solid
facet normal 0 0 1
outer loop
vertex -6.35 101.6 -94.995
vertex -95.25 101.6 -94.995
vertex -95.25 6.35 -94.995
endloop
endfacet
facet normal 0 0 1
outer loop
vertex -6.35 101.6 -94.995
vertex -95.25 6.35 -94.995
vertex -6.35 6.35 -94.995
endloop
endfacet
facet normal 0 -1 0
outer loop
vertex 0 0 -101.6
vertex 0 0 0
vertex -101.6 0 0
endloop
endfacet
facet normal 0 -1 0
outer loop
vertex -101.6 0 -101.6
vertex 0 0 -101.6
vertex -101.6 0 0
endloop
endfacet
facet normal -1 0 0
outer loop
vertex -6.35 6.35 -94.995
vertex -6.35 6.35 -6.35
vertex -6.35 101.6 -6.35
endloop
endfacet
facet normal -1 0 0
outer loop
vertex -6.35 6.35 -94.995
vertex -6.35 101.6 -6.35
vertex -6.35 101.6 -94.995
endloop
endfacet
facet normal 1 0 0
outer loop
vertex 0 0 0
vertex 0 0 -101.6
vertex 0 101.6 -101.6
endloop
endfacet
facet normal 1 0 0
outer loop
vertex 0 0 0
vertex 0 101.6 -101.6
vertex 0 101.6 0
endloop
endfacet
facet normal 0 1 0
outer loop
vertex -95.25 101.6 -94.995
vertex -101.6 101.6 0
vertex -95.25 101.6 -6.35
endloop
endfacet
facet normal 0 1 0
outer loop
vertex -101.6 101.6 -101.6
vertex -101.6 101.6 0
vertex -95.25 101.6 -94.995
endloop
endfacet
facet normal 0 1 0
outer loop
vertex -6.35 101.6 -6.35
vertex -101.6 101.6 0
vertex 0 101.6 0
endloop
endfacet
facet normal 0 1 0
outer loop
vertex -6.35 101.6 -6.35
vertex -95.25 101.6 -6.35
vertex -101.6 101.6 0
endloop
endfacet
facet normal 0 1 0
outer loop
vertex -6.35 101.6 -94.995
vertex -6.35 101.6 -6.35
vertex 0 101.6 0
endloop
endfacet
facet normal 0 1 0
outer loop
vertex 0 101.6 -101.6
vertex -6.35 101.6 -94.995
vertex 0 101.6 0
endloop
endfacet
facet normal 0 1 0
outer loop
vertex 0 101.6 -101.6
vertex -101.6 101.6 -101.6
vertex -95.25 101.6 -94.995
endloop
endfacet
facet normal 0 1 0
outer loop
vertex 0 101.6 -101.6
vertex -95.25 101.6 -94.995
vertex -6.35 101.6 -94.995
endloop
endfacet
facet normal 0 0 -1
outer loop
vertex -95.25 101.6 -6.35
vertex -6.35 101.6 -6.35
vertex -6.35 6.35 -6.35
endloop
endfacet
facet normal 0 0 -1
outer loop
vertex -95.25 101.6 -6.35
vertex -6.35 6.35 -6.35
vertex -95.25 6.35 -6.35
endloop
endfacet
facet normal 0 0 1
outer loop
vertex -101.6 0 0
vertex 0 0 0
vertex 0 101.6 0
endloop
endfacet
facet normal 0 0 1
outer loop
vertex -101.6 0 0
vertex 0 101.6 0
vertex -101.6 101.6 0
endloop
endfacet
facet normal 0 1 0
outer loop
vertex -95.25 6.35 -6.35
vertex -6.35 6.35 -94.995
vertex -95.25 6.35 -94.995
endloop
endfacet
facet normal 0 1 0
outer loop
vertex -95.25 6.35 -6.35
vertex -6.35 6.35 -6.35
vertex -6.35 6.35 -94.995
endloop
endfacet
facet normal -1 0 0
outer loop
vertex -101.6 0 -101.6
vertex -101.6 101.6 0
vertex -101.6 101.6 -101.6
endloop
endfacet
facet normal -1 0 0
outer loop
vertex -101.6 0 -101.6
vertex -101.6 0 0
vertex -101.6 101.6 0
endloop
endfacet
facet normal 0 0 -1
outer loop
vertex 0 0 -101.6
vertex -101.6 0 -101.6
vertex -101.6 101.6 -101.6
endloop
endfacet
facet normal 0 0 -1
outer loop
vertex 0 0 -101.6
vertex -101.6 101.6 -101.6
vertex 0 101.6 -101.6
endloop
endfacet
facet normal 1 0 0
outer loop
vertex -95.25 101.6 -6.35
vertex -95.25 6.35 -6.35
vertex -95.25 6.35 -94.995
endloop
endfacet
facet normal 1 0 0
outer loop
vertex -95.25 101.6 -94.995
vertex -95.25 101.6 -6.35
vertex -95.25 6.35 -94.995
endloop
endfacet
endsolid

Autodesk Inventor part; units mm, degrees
ref_plane "YZ Plane" through (0, 0, 0) normal (1, 0, 0) x (0, 1, 0)
ref_plane "XZ Plane" through (0, 0, 0) normal (0, 1, 0) x (-1, 0, 0)
ref_plane "XY Plane" through (0, 0, 0) normal (0, 0, 1) x (1, 0, 0)
sketch "Sketch1" plane through (0, 0, 0) normal (0, 1, 0) x (-1, 0, 0)
  line L0 (0, 0) -> (101.6, 0)
  line L1 (101.6, 0) -> (101.6, -101.6)
  line L2 (101.6, -101.6) -> (0, -101.6)
  line L3 (0, -101.6) -> (0, 0)
  dimension "d0" = 101.6
  dimension "d1" = 101.6
extrude "Extrusion1" add sketch "Sketch1" along normal blind 6.35
sketch "Sketch2" plane through (0, 6.35, 0) normal (0, 1, 0) x (1, 0, 0)
  line L0 (0, 0) -> (0, 6.35)
  line L1 (0, 0) -> (0, 101.6) projected
  line L2 (-6.35, 6.35) -> (-95.25, 6.35)
  line L3 (0, 0) -> (-101.6, 0)
  line L4 (-101.6, 0) -> (0, 0) projected
  line L5 (-101.6, 0) -> (-101.6, 101.6)
  line L6 (-101.6, 101.6) -> (0, 101.6)
  line L7 (0, 0) -> (0, 101.6)
  line L8 (-101.6, 0) -> (-95.25, 0)
  line L9 (-95.25, 6.35) -> (-95.25, 94.9949)
  line L10 (-95.25, 94.9949) -> (-6.35, 94.9949)
  line L11 (-6.35, 6.35) -> (-6.35, 94.9949)
extrude "Extrusion2" add sketch "Sketch2" along normal blind 95.25
properties part number "gear box"
